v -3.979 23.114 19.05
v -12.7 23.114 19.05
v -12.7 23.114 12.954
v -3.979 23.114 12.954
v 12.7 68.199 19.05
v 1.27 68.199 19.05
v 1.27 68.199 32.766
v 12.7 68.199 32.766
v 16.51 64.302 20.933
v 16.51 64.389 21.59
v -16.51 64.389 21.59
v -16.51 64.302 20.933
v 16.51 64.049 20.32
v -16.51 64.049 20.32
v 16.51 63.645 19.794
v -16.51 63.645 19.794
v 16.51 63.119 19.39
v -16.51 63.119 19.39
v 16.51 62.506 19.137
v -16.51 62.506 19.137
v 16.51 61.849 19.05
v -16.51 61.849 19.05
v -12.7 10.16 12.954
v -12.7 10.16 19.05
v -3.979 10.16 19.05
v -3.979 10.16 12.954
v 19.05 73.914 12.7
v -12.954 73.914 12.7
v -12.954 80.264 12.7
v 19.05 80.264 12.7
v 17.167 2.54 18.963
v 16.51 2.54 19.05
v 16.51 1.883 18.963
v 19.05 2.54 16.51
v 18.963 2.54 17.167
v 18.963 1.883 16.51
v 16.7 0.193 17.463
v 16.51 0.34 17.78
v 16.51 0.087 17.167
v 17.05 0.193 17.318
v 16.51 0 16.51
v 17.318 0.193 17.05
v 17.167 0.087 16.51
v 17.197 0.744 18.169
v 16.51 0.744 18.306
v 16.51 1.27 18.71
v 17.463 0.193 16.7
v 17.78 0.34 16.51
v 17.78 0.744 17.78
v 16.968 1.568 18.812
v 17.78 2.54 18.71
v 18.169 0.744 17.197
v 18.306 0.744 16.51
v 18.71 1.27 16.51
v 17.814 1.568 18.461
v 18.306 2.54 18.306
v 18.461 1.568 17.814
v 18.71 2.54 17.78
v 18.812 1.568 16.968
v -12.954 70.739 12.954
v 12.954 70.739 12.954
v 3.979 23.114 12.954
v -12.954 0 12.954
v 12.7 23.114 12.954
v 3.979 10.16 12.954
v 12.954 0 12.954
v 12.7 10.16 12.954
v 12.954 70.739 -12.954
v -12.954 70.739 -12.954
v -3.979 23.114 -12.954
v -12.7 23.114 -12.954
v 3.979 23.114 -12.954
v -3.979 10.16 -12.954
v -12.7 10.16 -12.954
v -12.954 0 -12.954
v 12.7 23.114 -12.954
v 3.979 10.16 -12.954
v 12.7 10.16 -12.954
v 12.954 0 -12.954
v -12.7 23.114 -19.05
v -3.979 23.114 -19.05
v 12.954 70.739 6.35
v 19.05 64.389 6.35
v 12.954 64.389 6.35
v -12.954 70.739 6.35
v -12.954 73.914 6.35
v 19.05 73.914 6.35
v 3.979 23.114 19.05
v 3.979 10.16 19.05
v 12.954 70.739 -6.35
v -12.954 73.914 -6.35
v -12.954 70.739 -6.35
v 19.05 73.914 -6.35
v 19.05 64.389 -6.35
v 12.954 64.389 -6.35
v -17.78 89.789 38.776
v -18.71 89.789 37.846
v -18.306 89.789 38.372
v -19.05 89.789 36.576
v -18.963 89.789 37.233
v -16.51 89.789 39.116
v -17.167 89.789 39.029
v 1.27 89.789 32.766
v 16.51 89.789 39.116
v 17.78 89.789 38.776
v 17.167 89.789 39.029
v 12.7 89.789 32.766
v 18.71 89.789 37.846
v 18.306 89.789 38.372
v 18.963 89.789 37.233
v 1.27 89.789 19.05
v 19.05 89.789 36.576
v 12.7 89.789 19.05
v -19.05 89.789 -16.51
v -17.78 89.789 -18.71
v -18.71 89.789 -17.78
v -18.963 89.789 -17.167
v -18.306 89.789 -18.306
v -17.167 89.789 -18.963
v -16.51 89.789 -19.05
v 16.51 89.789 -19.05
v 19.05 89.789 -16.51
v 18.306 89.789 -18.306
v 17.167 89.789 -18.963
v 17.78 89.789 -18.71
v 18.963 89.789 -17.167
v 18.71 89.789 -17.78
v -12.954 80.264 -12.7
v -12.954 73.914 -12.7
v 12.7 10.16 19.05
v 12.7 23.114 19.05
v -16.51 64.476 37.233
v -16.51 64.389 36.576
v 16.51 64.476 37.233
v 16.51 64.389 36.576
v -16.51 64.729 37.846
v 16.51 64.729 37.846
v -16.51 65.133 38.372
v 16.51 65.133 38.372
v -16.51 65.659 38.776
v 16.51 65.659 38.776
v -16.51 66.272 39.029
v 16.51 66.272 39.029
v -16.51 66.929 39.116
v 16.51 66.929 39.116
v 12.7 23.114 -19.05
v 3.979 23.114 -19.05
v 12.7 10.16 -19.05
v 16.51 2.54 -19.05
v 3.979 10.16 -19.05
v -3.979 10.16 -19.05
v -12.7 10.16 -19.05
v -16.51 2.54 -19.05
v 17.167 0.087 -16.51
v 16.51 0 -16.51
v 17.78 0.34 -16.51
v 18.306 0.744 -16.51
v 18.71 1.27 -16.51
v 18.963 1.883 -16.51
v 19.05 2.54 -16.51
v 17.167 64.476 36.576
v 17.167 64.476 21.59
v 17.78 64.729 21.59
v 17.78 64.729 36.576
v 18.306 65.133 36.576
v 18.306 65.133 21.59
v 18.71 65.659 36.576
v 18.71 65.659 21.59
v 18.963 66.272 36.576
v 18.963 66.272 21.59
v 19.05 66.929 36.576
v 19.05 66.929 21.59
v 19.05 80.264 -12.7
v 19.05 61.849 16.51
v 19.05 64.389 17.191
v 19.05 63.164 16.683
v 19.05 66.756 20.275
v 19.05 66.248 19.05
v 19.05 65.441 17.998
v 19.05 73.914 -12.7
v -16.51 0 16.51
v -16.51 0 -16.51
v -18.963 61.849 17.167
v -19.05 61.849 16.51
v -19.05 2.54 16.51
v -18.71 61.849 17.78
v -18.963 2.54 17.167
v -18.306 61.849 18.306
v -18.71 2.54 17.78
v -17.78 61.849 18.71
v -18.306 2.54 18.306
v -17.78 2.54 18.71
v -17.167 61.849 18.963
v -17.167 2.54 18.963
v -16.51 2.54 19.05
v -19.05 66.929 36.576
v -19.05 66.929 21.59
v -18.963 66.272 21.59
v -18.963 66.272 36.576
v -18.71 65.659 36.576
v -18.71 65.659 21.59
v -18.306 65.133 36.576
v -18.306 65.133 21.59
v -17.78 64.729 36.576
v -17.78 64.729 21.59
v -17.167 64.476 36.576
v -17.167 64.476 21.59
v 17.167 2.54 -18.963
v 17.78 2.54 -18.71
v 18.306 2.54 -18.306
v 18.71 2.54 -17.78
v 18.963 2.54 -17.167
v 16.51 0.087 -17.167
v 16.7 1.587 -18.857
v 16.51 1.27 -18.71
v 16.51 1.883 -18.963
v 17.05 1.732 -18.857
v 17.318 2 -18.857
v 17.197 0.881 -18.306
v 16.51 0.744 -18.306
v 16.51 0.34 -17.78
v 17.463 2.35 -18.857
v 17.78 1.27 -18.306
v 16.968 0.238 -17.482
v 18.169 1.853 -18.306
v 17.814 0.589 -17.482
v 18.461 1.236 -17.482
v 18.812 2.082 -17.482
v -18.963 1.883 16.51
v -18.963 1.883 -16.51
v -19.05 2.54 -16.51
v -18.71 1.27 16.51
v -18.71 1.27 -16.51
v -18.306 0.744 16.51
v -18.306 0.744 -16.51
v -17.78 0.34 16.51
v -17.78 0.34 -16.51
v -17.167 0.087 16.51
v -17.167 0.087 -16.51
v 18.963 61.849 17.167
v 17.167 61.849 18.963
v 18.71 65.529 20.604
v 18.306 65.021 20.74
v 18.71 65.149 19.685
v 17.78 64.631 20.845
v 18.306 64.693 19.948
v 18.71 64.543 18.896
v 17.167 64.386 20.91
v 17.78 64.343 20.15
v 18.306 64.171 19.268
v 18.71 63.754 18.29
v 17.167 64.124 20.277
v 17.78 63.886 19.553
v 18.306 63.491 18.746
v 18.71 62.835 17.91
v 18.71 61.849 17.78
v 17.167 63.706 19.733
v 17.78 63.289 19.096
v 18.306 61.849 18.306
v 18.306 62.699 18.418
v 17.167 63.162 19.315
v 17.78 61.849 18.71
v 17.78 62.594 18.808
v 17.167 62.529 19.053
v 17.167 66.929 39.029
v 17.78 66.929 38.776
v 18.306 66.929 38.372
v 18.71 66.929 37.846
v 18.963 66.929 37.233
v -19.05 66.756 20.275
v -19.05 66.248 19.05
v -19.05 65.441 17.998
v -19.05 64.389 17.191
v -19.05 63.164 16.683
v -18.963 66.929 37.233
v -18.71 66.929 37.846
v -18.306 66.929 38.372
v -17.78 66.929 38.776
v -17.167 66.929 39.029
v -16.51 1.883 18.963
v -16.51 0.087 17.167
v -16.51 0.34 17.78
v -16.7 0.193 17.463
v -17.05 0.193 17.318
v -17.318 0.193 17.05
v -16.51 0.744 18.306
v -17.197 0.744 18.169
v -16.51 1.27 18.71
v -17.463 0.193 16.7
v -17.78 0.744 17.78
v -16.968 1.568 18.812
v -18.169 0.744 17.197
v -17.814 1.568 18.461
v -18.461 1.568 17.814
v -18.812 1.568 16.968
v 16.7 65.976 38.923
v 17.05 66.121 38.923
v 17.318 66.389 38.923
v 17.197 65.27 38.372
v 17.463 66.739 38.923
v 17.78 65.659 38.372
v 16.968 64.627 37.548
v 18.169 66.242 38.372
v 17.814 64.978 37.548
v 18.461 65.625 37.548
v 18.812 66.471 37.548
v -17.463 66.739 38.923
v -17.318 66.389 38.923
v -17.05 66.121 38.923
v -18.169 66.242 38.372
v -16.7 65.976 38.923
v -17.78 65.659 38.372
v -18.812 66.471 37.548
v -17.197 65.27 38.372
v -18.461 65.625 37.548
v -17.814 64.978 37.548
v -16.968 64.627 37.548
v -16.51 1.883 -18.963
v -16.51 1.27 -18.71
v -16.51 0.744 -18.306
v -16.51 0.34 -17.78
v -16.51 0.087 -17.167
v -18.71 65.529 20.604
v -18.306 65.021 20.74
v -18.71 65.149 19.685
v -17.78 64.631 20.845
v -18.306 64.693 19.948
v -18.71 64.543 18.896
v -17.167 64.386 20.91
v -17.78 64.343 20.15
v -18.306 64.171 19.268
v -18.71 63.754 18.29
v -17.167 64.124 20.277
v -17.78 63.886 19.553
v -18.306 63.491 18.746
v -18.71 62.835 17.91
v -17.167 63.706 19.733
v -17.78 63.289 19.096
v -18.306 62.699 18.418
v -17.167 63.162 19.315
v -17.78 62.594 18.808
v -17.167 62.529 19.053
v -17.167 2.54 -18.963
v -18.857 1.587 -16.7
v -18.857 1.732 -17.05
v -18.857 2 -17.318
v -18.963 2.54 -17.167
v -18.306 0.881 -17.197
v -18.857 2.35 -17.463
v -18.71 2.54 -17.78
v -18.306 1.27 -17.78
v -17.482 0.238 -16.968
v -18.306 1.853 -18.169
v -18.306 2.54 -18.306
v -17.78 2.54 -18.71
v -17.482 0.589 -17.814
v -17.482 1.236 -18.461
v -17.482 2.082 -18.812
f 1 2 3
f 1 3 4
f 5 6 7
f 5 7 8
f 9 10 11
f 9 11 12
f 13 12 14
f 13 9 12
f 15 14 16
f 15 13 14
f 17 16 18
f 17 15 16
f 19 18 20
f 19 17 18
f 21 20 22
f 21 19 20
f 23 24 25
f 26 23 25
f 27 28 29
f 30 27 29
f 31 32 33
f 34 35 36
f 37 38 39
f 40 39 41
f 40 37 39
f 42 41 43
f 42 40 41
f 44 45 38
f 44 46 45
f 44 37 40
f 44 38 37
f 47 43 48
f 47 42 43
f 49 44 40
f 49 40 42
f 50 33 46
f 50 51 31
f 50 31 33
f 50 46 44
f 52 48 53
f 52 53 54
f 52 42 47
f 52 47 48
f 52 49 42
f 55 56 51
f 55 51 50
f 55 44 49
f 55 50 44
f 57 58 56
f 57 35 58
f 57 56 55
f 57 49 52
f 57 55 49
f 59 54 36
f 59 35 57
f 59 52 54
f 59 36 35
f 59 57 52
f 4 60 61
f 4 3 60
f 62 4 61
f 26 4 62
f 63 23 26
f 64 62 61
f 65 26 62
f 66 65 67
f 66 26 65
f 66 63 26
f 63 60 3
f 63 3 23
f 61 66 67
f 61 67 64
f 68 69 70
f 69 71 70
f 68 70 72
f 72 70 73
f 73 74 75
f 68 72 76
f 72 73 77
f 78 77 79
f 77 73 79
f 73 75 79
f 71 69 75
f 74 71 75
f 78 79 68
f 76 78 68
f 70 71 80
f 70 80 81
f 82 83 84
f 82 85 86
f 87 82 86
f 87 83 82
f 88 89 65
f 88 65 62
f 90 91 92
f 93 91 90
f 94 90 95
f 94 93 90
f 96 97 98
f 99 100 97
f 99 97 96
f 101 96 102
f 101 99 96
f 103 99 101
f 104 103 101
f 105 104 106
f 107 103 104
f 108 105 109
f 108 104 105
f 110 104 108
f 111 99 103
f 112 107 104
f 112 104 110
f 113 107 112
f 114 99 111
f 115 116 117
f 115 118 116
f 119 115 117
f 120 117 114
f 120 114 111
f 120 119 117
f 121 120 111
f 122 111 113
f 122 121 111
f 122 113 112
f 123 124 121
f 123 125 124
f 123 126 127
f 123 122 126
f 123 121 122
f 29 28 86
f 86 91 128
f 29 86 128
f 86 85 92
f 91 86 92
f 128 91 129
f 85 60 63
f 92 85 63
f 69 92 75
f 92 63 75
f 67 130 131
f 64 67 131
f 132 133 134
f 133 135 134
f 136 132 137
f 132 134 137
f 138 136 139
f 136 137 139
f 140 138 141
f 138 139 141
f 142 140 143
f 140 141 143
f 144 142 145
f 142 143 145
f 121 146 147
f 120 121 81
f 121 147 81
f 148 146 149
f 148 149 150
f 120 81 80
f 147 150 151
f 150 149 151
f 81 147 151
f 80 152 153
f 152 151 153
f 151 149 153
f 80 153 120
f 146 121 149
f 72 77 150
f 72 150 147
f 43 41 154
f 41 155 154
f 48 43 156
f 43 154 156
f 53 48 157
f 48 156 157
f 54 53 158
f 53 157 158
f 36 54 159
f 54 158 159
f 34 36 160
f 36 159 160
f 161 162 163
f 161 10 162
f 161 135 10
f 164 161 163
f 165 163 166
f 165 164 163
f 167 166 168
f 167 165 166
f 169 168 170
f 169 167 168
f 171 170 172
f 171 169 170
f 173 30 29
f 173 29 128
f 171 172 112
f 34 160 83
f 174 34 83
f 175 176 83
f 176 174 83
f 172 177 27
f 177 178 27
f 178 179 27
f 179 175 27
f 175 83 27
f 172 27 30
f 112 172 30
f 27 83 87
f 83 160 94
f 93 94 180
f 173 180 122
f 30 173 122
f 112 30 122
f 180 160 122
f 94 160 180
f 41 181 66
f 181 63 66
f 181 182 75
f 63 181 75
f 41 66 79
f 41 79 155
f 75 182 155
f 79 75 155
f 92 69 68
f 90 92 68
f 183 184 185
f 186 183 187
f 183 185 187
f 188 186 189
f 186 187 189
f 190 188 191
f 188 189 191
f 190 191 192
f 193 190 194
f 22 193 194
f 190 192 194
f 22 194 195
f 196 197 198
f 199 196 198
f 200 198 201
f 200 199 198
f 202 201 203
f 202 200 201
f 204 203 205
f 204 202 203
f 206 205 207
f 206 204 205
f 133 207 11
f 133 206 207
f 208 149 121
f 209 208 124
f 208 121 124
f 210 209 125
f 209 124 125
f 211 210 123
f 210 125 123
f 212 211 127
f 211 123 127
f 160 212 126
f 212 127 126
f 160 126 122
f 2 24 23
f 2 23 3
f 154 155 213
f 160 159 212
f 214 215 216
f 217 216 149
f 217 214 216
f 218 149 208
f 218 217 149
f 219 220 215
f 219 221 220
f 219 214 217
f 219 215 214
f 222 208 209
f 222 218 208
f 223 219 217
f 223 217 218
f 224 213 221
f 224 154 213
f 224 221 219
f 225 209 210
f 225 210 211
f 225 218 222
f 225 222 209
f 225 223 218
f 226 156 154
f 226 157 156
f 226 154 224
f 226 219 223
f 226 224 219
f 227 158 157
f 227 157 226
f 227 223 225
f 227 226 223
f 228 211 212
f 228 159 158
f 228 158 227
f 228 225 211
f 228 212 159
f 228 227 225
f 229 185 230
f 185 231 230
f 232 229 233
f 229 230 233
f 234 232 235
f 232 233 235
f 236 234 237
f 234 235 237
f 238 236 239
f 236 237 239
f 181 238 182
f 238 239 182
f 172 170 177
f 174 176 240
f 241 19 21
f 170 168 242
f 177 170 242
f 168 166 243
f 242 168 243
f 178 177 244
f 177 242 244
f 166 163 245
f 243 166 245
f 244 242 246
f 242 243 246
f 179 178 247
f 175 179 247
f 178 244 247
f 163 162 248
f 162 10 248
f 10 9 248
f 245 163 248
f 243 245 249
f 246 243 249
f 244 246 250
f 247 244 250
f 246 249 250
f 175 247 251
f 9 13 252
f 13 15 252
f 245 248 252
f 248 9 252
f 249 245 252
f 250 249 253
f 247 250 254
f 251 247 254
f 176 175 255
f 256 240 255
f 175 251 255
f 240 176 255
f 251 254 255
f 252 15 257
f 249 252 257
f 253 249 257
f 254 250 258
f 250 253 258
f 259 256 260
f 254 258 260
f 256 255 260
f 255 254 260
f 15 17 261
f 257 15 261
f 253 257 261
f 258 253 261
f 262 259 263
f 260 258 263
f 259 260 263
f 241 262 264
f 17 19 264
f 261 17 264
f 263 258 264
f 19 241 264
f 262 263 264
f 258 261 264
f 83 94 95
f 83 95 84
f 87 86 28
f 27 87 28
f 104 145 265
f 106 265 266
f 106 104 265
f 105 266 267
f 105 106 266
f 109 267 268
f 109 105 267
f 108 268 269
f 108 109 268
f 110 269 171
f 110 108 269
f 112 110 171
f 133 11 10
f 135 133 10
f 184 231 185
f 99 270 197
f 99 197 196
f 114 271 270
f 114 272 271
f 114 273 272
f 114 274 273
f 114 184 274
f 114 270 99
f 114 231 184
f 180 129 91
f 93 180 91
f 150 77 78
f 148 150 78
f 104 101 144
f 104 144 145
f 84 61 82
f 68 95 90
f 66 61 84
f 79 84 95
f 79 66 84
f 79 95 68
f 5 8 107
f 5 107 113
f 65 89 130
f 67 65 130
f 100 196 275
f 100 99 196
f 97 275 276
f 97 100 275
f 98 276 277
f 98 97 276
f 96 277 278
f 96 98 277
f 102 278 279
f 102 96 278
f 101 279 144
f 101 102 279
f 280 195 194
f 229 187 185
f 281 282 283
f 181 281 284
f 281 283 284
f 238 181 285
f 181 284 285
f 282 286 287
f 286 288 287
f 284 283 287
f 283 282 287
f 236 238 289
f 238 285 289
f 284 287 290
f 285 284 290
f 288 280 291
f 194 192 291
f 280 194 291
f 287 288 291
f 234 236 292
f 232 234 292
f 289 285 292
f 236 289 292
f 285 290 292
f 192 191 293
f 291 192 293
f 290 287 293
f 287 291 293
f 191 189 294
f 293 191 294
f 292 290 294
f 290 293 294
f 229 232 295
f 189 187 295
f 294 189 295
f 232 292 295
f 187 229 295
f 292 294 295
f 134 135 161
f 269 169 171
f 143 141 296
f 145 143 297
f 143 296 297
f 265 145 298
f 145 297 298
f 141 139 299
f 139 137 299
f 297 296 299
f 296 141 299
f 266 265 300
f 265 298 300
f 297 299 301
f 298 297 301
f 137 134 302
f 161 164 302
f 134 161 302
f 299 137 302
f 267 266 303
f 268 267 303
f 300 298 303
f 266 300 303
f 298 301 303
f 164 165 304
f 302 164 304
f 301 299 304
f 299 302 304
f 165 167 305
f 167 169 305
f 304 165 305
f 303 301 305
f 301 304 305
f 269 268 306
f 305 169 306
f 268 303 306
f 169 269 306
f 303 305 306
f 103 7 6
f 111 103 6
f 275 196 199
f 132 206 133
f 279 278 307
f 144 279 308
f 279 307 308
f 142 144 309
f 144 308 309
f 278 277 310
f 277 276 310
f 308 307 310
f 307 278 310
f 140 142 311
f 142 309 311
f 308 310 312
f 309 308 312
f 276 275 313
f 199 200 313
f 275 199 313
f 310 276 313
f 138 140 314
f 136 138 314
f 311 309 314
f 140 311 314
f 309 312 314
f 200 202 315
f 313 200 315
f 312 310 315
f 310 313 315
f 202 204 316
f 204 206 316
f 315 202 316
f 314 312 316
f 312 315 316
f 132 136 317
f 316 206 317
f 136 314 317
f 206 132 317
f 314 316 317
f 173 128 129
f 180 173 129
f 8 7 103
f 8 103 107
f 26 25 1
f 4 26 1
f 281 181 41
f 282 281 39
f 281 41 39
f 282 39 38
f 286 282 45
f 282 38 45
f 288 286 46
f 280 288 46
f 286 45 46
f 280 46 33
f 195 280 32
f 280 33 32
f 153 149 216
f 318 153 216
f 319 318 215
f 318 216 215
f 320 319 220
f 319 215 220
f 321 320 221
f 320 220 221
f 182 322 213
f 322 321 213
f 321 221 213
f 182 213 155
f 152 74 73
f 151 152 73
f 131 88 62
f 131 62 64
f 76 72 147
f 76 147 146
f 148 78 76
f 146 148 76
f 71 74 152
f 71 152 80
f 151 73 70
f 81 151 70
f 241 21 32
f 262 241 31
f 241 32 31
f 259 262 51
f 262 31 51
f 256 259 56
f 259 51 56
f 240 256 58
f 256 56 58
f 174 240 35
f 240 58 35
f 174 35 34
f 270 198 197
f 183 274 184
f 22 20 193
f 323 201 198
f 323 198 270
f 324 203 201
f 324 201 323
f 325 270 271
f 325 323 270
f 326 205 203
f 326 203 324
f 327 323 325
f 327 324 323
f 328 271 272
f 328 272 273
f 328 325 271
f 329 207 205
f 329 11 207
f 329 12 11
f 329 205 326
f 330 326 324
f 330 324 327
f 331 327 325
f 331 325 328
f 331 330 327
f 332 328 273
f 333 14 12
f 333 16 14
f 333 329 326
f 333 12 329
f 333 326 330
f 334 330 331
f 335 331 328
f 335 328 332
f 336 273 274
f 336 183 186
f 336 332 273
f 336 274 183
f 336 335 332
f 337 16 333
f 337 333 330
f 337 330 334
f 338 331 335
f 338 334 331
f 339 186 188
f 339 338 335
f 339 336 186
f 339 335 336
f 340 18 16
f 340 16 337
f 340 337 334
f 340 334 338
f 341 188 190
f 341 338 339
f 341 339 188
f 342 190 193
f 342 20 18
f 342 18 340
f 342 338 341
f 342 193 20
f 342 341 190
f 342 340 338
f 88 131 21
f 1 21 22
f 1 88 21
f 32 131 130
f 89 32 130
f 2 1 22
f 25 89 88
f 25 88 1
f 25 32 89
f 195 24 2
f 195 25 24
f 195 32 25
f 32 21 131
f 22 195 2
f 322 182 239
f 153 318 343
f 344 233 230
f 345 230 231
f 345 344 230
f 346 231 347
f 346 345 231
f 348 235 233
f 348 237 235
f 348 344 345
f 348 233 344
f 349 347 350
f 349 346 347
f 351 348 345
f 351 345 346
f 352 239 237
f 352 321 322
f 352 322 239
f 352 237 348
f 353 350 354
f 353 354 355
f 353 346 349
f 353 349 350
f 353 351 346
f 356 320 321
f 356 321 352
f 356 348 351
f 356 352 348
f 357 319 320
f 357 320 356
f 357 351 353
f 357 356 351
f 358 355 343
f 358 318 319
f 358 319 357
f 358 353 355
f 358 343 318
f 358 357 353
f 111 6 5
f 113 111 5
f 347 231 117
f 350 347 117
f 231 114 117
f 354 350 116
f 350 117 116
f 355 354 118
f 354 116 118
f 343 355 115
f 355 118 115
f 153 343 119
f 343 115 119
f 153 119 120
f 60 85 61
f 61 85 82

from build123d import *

# Parameters (mm, degrees)
SKETCH1_W           = 38.1
SKETCH1_H           = 38.1
BOSS_EXTRUDE1_DEPTH = 64.389
SKETCH2_W           = 8.720666582
SKETCH2_H           = 12.954
CUT_EXTRUDE1_DEPTH  = 38.1
SKETCH3_W           = 38.1
SKETCH3_H           = 38.1
BOSS_EXTRUDE2_DEPTH = 25.4
SKETCH1_3_W         = 25.908
SKETCH1_3_H         = 25.908
CUT_EXTRUDE2_DEPTH  = 70.739
CUT_EXTRUDE4_DEPTH  = 32.004
SKETCH7_W           = 38.1
SKETCH7_H           = 25.4
BOSS_EXTRUDE3_DEPTH = 20.066
SKETCH9_W           = 11.43
SKETCH9_H           = 13.716
CUT_EXTRUDE5_DEPTH  = 21.59
FILLET1_R           = 2.54


with BuildPart() as part:
    # Sketch1 → Boss-Extrude1 (new body)
    with BuildSketch(Plane(origin=(0, 0, 0), x_dir=(1, 0, 0), z_dir=(0, 1, 0))):
        Rectangle(SKETCH1_W, SKETCH1_H)
    extrude(amount=BOSS_EXTRUDE1_DEPTH)

    # Sketch2 → Cut-Extrude1 (cut)
    with BuildSketch(Plane.XY.offset(19.05)):
        with Locations((8.339666836, 16.637)):
            Rectangle(SKETCH2_W, SKETCH2_H)
        with Locations((-8.339666709, 16.637)):
            Rectangle(SKETCH2_W, SKETCH2_H)
    extrude(amount=-CUT_EXTRUDE1_DEPTH, mode=Mode.SUBTRACT)

    # Sketch3 → Boss-Extrude2 (add)
    with BuildSketch(Plane(origin=(0, 64.389, 0), x_dir=(-1, 0, 0), z_dir=(0, -1, 0))):
        Rectangle(SKETCH3_W, SKETCH3_H)
    extrude(amount=-BOSS_EXTRUDE2_DEPTH)

    # Sketch1<3> → Cut-Extrude2 (cut)
    with BuildSketch(Plane(origin=(0, 0, 0), x_dir=(1, 0, 0), z_dir=(0, 1, 0))):
        Rectangle(SKETCH1_3_W, SKETCH1_3_H)
    extrude(amount=CUT_EXTRUDE2_DEPTH, mode=Mode.SUBTRACT)

    # Sketch5 → Cut-Extrude4 (cut)
    with BuildSketch(Plane(origin=(19.05, 0, 0), x_dir=(0, 0, -1), z_dir=(1, 0, 0))):
        Polygon((-12.7, 80.264), (12.7, 80.264), (12.7, 73.914), (6.35, 73.914), (6.35, 64.389), (-6.35, 64.389), (-6.35, 73.914), (-12.7, 73.914), align=None)
    extrude(amount=-CUT_EXTRUDE4_DEPTH, mode=Mode.SUBTRACT)

    # Sketch7 → Boss-Extrude3 (add)
    with BuildSketch(Plane.XY.offset(19.05)):
        with Locations((0, 77.089)):
            Rectangle(SKETCH7_W, SKETCH7_H)
    extrude(amount=BOSS_EXTRUDE3_DEPTH)

    # Sketch9 → Cut-Extrude5 (cut)
    with BuildSketch(Plane(origin=(0, 89.789, 0), x_dir=(1, 0, 0), z_dir=(0, 1, 0))):
        with Locations((6.985, -25.908)):
            Rectangle(SKETCH9_W, SKETCH9_H)
    extrude(amount=-CUT_EXTRUDE5_DEPTH, mode=Mode.SUBTRACT)

    # Fillet1
    fillet1_edges = [part.edges().sort_by_distance(p)[0] for p in [
        (19.05, 32.1945, 19.05),
        (-19.05, 32.1945, 19.05),
        (0, 64.389, 19.05),
        (-19.05, 64.389, 29.083),
        (19.05, 64.389, 29.083),
        (-19.05, 77.089, 39.116),
        (0, 64.389, 39.116),
        (19.05, 77.089, 39.116),
        (0, 0, 19.05),
        (19.05, 0, 0),
        (0, 0, -19.05),
        (-19.05, 0, 0),
        (19.05, 44.8945, -19.05),
        (-19.05, 44.8945, -19.05),
    ]]
    fillet(fillet1_edges, radius=FILLET1_R)


solid = part.part
